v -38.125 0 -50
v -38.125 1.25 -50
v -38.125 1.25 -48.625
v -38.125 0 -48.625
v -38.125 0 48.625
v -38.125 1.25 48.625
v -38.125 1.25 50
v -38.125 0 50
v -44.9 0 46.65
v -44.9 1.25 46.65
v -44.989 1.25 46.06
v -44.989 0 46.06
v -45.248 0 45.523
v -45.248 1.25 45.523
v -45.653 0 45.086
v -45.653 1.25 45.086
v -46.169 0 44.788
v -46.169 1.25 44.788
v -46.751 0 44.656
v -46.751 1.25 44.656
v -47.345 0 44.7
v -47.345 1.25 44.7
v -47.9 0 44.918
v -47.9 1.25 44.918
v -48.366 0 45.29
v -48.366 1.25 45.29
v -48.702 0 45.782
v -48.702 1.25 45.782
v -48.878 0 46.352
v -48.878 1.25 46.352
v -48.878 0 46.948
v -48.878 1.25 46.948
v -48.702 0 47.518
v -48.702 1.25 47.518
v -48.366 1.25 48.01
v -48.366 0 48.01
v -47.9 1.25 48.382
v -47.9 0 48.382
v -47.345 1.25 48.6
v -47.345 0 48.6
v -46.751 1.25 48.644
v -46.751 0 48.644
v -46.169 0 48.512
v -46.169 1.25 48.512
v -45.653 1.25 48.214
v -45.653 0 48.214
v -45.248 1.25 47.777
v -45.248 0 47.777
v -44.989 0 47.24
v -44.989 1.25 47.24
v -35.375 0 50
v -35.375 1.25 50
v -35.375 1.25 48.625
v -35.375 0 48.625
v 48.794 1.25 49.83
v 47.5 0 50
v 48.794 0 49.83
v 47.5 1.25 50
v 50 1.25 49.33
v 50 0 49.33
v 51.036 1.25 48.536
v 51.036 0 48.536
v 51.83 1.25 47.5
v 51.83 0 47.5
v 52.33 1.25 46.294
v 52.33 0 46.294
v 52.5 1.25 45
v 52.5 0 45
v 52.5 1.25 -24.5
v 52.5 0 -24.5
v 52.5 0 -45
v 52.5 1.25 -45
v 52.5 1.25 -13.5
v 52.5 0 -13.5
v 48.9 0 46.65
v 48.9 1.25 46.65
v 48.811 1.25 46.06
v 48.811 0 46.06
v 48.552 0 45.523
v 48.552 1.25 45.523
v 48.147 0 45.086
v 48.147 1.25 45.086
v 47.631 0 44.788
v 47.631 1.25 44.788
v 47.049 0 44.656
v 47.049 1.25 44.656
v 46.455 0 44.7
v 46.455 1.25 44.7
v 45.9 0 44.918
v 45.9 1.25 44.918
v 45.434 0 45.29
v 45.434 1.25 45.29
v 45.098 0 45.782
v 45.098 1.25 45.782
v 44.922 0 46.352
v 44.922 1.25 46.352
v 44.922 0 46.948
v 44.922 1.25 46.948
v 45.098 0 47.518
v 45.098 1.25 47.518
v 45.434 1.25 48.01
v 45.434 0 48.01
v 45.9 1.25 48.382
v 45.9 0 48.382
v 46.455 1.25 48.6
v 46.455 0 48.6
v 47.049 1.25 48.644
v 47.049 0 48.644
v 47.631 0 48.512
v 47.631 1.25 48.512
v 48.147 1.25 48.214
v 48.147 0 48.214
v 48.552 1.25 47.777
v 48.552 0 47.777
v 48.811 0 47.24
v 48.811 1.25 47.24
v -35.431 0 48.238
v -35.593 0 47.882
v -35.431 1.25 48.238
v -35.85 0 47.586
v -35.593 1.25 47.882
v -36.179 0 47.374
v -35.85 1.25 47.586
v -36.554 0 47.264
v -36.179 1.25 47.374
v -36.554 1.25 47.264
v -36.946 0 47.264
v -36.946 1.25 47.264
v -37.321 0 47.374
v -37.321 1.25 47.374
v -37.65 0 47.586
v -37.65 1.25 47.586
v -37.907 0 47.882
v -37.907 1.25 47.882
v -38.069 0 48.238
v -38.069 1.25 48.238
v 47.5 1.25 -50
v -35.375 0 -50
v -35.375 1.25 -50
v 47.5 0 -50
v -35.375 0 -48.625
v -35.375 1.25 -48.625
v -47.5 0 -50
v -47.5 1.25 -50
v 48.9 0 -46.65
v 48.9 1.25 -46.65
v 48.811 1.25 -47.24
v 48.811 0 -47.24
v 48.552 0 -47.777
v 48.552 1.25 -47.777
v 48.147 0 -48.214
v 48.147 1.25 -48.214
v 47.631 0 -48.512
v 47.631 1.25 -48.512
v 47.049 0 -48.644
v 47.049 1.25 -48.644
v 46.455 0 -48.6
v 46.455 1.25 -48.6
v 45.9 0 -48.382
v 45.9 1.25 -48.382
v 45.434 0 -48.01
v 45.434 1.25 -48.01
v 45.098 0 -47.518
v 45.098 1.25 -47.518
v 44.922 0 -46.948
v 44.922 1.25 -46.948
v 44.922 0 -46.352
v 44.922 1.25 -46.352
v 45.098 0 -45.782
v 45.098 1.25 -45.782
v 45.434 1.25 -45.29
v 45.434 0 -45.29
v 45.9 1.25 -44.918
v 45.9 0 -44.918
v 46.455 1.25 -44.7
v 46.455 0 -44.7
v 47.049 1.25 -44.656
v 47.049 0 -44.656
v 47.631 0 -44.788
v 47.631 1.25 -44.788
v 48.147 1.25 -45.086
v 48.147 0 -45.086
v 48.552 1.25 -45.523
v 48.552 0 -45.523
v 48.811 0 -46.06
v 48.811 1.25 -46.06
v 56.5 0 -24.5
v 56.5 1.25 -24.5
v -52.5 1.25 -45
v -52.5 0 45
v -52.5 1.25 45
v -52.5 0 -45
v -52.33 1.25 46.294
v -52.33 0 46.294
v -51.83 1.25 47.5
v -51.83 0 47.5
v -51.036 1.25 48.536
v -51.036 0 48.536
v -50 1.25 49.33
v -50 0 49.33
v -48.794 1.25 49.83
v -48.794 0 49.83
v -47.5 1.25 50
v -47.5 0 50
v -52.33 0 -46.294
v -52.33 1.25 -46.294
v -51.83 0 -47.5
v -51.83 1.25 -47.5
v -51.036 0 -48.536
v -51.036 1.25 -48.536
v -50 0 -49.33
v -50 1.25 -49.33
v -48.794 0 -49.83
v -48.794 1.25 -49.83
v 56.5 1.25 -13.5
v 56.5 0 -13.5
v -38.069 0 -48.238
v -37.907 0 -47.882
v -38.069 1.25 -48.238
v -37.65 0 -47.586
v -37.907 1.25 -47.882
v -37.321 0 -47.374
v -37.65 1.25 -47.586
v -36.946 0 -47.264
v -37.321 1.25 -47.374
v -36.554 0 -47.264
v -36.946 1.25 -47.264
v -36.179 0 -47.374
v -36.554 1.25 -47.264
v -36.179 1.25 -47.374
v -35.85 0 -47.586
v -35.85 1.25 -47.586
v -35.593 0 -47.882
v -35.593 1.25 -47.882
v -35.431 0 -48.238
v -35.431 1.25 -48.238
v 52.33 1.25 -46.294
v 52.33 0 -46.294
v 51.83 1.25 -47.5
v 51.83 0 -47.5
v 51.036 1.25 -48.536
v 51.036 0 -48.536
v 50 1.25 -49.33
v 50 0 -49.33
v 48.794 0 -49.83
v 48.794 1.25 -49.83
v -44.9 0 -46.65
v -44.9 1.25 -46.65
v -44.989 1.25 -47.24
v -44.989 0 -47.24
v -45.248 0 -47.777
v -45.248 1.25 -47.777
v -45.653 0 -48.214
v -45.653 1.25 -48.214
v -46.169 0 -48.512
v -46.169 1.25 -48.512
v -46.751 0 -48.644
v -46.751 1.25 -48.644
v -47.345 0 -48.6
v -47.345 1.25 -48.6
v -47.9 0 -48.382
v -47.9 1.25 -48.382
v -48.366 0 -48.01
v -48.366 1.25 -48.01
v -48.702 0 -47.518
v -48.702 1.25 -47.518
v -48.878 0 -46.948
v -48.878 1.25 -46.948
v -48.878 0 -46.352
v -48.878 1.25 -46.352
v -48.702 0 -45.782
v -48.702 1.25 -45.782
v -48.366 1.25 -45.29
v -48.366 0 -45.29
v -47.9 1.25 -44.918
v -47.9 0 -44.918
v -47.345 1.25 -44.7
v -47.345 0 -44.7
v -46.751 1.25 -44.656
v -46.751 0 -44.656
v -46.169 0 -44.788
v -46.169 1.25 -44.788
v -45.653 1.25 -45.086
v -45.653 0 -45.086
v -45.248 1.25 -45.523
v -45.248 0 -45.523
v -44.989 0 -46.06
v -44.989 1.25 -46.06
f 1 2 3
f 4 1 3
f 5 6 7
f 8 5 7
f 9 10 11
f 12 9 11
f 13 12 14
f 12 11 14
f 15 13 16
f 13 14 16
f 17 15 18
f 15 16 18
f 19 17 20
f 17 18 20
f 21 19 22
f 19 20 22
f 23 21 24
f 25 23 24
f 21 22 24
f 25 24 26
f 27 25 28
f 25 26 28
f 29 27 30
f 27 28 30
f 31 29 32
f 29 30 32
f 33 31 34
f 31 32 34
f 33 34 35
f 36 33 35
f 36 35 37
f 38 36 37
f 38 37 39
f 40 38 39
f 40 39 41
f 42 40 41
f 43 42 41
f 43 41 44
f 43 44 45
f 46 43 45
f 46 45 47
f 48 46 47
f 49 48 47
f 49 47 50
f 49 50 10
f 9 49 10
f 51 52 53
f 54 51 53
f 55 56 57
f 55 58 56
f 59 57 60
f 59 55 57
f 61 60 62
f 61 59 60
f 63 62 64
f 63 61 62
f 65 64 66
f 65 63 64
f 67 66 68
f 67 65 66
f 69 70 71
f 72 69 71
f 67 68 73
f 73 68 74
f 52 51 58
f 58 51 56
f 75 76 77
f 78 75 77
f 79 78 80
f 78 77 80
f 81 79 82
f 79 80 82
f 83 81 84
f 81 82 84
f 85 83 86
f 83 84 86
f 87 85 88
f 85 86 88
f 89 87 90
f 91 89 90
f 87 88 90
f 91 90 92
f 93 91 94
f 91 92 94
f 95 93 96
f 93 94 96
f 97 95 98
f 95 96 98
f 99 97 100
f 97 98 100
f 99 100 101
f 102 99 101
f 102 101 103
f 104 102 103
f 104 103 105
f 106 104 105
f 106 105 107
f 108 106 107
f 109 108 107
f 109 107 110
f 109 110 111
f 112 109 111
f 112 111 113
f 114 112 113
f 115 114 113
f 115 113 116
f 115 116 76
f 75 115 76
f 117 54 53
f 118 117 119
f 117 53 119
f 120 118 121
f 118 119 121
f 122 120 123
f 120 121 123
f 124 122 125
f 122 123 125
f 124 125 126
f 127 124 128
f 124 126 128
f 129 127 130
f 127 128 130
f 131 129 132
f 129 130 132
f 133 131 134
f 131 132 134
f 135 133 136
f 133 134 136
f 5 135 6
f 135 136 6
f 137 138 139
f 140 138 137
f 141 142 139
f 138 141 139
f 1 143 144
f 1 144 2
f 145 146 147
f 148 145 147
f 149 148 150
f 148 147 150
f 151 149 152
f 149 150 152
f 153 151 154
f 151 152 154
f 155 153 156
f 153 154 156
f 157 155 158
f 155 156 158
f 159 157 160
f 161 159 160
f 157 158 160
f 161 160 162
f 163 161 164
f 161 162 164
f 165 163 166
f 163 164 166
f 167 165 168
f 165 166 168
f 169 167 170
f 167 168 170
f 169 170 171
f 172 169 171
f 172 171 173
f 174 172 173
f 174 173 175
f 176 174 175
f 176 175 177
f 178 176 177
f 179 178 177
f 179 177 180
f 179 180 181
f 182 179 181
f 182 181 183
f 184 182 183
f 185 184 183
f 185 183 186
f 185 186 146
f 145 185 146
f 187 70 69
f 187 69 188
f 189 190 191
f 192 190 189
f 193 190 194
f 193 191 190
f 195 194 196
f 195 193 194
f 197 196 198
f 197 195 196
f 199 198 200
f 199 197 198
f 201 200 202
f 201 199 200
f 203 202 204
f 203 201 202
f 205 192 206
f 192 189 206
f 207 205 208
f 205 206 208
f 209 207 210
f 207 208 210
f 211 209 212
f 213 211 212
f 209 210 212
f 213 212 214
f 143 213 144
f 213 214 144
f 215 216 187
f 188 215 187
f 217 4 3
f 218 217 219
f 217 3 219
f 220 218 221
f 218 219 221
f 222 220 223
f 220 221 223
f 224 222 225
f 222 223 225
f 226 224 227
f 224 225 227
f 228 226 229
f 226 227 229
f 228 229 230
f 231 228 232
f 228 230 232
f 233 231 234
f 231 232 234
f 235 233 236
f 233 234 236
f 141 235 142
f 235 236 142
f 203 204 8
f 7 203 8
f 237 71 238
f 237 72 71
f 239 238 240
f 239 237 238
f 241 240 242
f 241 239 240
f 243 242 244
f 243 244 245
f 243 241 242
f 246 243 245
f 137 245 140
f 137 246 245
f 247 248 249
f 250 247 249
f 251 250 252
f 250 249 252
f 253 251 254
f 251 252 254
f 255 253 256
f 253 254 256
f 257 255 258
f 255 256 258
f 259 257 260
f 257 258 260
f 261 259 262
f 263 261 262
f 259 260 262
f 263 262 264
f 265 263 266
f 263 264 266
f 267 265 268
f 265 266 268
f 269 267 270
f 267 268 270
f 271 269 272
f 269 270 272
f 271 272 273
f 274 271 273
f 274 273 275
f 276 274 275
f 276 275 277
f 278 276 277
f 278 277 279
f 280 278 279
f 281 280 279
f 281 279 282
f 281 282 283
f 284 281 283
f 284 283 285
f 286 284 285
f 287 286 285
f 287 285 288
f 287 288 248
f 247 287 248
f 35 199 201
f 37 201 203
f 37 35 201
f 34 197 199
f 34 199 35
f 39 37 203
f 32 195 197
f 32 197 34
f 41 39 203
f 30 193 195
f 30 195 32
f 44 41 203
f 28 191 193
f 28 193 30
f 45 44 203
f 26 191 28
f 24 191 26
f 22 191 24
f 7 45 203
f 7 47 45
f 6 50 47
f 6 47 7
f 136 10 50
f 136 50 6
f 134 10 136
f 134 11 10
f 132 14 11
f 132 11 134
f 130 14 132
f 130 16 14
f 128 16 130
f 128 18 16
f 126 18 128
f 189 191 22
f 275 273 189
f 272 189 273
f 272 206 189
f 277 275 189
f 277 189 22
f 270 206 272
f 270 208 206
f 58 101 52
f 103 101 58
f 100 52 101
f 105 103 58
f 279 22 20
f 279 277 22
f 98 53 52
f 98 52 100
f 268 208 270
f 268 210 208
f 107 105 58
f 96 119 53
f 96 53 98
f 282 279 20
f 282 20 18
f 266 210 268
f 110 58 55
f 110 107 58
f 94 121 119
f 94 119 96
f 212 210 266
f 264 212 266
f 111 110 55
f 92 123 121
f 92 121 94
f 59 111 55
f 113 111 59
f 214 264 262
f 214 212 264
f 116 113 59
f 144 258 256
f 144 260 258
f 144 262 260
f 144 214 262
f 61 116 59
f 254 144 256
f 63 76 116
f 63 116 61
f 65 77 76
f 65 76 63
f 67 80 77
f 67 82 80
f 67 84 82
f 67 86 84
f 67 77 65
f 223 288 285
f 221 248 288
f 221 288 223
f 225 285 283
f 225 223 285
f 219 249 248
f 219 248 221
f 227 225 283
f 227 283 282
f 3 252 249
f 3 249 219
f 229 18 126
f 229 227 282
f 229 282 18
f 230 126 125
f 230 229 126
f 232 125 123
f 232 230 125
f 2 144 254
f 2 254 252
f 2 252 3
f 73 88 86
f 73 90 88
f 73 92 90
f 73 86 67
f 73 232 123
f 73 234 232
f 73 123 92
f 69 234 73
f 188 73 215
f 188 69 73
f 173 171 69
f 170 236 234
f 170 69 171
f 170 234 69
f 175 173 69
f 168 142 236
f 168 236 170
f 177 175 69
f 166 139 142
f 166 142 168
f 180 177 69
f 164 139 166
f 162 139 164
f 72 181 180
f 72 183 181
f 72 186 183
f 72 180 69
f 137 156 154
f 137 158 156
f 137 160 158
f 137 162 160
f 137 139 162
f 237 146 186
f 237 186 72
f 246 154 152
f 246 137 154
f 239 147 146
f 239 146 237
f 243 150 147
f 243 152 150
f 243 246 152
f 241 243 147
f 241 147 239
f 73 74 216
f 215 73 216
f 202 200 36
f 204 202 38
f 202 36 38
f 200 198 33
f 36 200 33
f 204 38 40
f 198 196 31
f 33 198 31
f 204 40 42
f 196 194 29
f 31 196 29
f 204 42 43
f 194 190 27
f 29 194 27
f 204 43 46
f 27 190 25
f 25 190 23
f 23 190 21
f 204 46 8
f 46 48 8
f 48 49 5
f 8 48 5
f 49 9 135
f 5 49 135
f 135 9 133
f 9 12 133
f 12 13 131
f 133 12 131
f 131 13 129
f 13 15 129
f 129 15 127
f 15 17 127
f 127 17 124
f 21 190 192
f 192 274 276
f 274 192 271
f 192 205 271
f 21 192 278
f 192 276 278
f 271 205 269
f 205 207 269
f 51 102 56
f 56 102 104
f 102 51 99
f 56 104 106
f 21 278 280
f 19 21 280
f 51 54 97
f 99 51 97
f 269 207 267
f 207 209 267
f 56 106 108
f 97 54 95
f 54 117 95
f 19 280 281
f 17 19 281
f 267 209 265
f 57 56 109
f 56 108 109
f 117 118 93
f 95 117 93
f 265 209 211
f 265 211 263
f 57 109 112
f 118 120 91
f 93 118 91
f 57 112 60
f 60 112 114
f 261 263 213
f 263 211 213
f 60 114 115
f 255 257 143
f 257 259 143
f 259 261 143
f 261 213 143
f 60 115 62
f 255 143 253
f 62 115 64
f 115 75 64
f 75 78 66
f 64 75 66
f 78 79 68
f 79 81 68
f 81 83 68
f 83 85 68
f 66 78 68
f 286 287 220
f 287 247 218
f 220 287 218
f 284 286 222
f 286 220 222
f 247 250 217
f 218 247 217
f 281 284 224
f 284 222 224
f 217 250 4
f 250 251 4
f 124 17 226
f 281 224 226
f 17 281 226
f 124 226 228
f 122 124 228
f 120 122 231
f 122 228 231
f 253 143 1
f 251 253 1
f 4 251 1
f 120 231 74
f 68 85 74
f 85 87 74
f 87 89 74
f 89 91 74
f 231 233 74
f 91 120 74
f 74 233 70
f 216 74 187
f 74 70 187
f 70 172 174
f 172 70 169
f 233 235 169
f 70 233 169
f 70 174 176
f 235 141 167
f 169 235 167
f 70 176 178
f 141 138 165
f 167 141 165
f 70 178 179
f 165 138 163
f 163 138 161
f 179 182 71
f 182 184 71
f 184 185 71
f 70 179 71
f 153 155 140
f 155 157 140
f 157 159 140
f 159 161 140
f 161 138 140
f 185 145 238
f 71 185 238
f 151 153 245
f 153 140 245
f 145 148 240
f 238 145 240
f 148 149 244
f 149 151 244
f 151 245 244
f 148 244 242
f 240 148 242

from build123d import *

# Parameters (mm, degrees)
SKETCH1_W                  = 105
SKETCH1_H                  = 100
SKETCH1_W_2                = 4
SKETCH1_H_2                = 11
MAIN_PCB_DEPTH             = 1.25
MAIN_PCB_ROUNDED_CORNERS_R = 5
MAIN_PCB_HOLES_REACH       = 3.25
SKETCH2_R                  = 2
SKETCH2_R_2                = 1.375


with BuildPart() as part:
    # Sketch1 → Main PCB (new body)
    with BuildSketch(Plane(origin=(0, 0, 0), x_dir=(1, 0, 0), z_dir=(0, 1, 0))):
        Rectangle(SKETCH1_W, SKETCH1_H)
        with Locations((54.5, 19)):
            Rectangle(SKETCH1_W_2, SKETCH1_H_2)
    extrude(amount=MAIN_PCB_DEPTH)

    # Main PCB rounded corners
    main_pcb_rounded_corners_edges = [part.edges().sort_by_distance(p)[0] for p in [
        (52.5, 0.625, 50),
        (-52.5, 0.625, 50),
        (-52.5, 0.625, -50),
        (52.5, 0.625, -50),
    ]]
    fillet(main_pcb_rounded_corners_edges, radius=MAIN_PCB_ROUNDED_CORNERS_R)

    # Sketch2 → Main PCB holes (cut, up to next)
    with BuildSketch(Plane(origin=(0, 1.25, 0), x_dir=(1, 0, 0), z_dir=(0, 1, 0)), mode=Mode.PRIVATE) as main_pcb_holes_sk1:
        with Locations((-46.9, 46.65)):
            Circle(SKETCH2_R)
    main_pcb_holes_tool1 = extrude(main_pcb_holes_sk1.sketch, amount=-MAIN_PCB_HOLES_REACH, mode=Mode.PRIVATE) & part.part
    add(main_pcb_holes_tool1.solids().sort_by_distance((-46.9, 1.25, -46.65))[0], mode=Mode.SUBTRACT)
    # Sketch2 → Main PCB holes (cut, up to next)
    with BuildSketch(Plane(origin=(0, 1.25, 0), x_dir=(1, 0, 0), z_dir=(0, 1, 0)), mode=Mode.PRIVATE) as main_pcb_holes_sk2:
        with Locations((46.9, 46.65)):
            Circle(SKETCH2_R)
    main_pcb_holes_tool2 = extrude(main_pcb_holes_sk2.sketch, amount=-MAIN_PCB_HOLES_REACH, mode=Mode.PRIVATE) & part.part
    add(main_pcb_holes_tool2.solids().sort_by_distance((46.9, 1.25, -46.65))[0], mode=Mode.SUBTRACT)
    # Sketch2 → Main PCB holes (cut, up to next)
    with BuildSketch(Plane(origin=(0, 1.25, 0), x_dir=(1, 0, 0), z_dir=(0, 1, 0)), mode=Mode.PRIVATE) as main_pcb_holes_sk3:
        with Locations((46.9, -46.65)):
            Circle(SKETCH2_R)
    main_pcb_holes_tool3 = extrude(main_pcb_holes_sk3.sketch, amount=-MAIN_PCB_HOLES_REACH, mode=Mode.PRIVATE) & part.part
    add(main_pcb_holes_tool3.solids().sort_by_distance((46.9, 1.25, 46.65))[0], mode=Mode.SUBTRACT)
    # Sketch2 → Main PCB holes (cut, up to next)
    with BuildSketch(Plane(origin=(0, 1.25, 0), x_dir=(1, 0, 0), z_dir=(0, 1, 0)), mode=Mode.PRIVATE) as main_pcb_holes_sk4:
        with Locations((-46.9, -46.65)):
            Circle(SKETCH2_R)
    main_pcb_holes_tool4 = extrude(main_pcb_holes_sk4.sketch, amount=-MAIN_PCB_HOLES_REACH, mode=Mode.PRIVATE) & part.part
    add(main_pcb_holes_tool4.solids().sort_by_distance((-46.9, 1.25, 46.65))[0], mode=Mode.SUBTRACT)
    # Sketch2 → Main PCB holes (cut, up to next)
    with BuildSketch(Plane(origin=(0, 1.25, 0), x_dir=(1, 0, 0), z_dir=(0, 1, 0)), mode=Mode.PRIVATE) as main_pcb_holes_sk5:
        with Locations((-36.75, -48.625)):
            Circle(SKETCH2_R_2)
    main_pcb_holes_tool5 = extrude(main_pcb_holes_sk5.sketch, amount=-MAIN_PCB_HOLES_REACH, mode=Mode.PRIVATE) & part.part
    add(main_pcb_holes_tool5.solids().sort_by_distance((-36.75, 1.25, 48.625))[0], mode=Mode.SUBTRACT)
    # Sketch2 → Main PCB holes (cut, up to next)
    with BuildSketch(Plane(origin=(0, 1.25, 0), x_dir=(1, 0, 0), z_dir=(0, 1, 0)), mode=Mode.PRIVATE) as main_pcb_holes_sk6:
        with BuildLine():
            ThreePointArc((-36.75, -50), (-37.722271824, -49.597271824), (-38.125, -48.625))
            Line((-38.125, -48.625), (-38.125, -50))
            Line((-38.125, -50), (-36.75, -50))
        make_face()
    main_pcb_holes_tool6 = extrude(main_pcb_holes_sk6.sketch, amount=-MAIN_PCB_HOLES_REACH, mode=Mode.PRIVATE) & part.part
    add(main_pcb_holes_tool6.solids().sort_by_distance((-37.817869, 1.25, 49.692869))[0], mode=Mode.SUBTRACT)
    # Sketch2 → Main PCB holes (cut, up to next)
    with BuildSketch(Plane(origin=(0, 1.25, 0), x_dir=(1, 0, 0), z_dir=(0, 1, 0)), mode=Mode.PRIVATE) as main_pcb_holes_sk7:
        with BuildLine():
            Line((-35.375, -50), (-35.375, -48.625))
            ThreePointArc((-35.375, -48.625), (-35.777728176, -49.597271824), (-36.75, -50))
            Line((-36.75, -50), (-35.375, -50))
        make_face()
    main_pcb_holes_tool7 = extrude(main_pcb_holes_sk7.sketch, amount=-MAIN_PCB_HOLES_REACH, mode=Mode.PRIVATE) & part.part
    add(main_pcb_holes_tool7.solids().sort_by_distance((-35.682131, 1.25, 49.692869))[0], mode=Mode.SUBTRACT)
    # Sketch2 → Main PCB holes (cut, up to next)
    with BuildSketch(Plane(origin=(0, 1.25, 0), x_dir=(1, 0, 0), z_dir=(0, 1, 0)), mode=Mode.PRIVATE) as main_pcb_holes_sk8:
        with BuildLine():
            Line((-36.75, 50), (-38.125, 50))
            Line((-38.125, 50), (-38.125, 48.625))
            ThreePointArc((-38.125, 48.625), (-37.722271824, 49.597271824), (-36.75, 50))
        make_face()
    main_pcb_holes_tool8 = extrude(main_pcb_holes_sk8.sketch, amount=-MAIN_PCB_HOLES_REACH, mode=Mode.PRIVATE) & part.part
    add(main_pcb_holes_tool8.solids().sort_by_distance((-37.817869, 1.25, -49.692869))[0], mode=Mode.SUBTRACT)
    # Sketch2 → Main PCB holes (cut, up to next)
    with BuildSketch(Plane(origin=(0, 1.25, 0), x_dir=(1, 0, 0), z_dir=(0, 1, 0)), mode=Mode.PRIVATE) as main_pcb_holes_sk9:
        with Locations((-36.75, 48.625)):
            Circle(SKETCH2_R_2)
    main_pcb_holes_tool9 = extrude(main_pcb_holes_sk9.sketch, amount=-MAIN_PCB_HOLES_REACH, mode=Mode.PRIVATE) & part.part
    add(main_pcb_holes_tool9.solids().sort_by_distance((-36.75, 1.25, -48.625))[0], mode=Mode.SUBTRACT)
    # Sketch2 → Main PCB holes (cut, up to next)
    with BuildSketch(Plane(origin=(0, 1.25, 0), x_dir=(1, 0, 0), z_dir=(0, 1, 0)), mode=Mode.PRIVATE) as main_pcb_holes_sk10:
        with BuildLine():
            Line((-35.375, 50), (-36.75, 50))
            ThreePointArc((-36.75, 50), (-35.777728176, 49.597271824), (-35.375, 48.625))
            Line((-35.375, 48.625), (-35.375, 50))
        make_face()
    main_pcb_holes_tool10 = extrude(main_pcb_holes_sk10.sketch, amount=-MAIN_PCB_HOLES_REACH, mode=Mode.PRIVATE) & part.part
    add(main_pcb_holes_tool10.solids().sort_by_distance((-35.682131, 1.25, -49.692869))[0], mode=Mode.SUBTRACT)


solid = part.part
